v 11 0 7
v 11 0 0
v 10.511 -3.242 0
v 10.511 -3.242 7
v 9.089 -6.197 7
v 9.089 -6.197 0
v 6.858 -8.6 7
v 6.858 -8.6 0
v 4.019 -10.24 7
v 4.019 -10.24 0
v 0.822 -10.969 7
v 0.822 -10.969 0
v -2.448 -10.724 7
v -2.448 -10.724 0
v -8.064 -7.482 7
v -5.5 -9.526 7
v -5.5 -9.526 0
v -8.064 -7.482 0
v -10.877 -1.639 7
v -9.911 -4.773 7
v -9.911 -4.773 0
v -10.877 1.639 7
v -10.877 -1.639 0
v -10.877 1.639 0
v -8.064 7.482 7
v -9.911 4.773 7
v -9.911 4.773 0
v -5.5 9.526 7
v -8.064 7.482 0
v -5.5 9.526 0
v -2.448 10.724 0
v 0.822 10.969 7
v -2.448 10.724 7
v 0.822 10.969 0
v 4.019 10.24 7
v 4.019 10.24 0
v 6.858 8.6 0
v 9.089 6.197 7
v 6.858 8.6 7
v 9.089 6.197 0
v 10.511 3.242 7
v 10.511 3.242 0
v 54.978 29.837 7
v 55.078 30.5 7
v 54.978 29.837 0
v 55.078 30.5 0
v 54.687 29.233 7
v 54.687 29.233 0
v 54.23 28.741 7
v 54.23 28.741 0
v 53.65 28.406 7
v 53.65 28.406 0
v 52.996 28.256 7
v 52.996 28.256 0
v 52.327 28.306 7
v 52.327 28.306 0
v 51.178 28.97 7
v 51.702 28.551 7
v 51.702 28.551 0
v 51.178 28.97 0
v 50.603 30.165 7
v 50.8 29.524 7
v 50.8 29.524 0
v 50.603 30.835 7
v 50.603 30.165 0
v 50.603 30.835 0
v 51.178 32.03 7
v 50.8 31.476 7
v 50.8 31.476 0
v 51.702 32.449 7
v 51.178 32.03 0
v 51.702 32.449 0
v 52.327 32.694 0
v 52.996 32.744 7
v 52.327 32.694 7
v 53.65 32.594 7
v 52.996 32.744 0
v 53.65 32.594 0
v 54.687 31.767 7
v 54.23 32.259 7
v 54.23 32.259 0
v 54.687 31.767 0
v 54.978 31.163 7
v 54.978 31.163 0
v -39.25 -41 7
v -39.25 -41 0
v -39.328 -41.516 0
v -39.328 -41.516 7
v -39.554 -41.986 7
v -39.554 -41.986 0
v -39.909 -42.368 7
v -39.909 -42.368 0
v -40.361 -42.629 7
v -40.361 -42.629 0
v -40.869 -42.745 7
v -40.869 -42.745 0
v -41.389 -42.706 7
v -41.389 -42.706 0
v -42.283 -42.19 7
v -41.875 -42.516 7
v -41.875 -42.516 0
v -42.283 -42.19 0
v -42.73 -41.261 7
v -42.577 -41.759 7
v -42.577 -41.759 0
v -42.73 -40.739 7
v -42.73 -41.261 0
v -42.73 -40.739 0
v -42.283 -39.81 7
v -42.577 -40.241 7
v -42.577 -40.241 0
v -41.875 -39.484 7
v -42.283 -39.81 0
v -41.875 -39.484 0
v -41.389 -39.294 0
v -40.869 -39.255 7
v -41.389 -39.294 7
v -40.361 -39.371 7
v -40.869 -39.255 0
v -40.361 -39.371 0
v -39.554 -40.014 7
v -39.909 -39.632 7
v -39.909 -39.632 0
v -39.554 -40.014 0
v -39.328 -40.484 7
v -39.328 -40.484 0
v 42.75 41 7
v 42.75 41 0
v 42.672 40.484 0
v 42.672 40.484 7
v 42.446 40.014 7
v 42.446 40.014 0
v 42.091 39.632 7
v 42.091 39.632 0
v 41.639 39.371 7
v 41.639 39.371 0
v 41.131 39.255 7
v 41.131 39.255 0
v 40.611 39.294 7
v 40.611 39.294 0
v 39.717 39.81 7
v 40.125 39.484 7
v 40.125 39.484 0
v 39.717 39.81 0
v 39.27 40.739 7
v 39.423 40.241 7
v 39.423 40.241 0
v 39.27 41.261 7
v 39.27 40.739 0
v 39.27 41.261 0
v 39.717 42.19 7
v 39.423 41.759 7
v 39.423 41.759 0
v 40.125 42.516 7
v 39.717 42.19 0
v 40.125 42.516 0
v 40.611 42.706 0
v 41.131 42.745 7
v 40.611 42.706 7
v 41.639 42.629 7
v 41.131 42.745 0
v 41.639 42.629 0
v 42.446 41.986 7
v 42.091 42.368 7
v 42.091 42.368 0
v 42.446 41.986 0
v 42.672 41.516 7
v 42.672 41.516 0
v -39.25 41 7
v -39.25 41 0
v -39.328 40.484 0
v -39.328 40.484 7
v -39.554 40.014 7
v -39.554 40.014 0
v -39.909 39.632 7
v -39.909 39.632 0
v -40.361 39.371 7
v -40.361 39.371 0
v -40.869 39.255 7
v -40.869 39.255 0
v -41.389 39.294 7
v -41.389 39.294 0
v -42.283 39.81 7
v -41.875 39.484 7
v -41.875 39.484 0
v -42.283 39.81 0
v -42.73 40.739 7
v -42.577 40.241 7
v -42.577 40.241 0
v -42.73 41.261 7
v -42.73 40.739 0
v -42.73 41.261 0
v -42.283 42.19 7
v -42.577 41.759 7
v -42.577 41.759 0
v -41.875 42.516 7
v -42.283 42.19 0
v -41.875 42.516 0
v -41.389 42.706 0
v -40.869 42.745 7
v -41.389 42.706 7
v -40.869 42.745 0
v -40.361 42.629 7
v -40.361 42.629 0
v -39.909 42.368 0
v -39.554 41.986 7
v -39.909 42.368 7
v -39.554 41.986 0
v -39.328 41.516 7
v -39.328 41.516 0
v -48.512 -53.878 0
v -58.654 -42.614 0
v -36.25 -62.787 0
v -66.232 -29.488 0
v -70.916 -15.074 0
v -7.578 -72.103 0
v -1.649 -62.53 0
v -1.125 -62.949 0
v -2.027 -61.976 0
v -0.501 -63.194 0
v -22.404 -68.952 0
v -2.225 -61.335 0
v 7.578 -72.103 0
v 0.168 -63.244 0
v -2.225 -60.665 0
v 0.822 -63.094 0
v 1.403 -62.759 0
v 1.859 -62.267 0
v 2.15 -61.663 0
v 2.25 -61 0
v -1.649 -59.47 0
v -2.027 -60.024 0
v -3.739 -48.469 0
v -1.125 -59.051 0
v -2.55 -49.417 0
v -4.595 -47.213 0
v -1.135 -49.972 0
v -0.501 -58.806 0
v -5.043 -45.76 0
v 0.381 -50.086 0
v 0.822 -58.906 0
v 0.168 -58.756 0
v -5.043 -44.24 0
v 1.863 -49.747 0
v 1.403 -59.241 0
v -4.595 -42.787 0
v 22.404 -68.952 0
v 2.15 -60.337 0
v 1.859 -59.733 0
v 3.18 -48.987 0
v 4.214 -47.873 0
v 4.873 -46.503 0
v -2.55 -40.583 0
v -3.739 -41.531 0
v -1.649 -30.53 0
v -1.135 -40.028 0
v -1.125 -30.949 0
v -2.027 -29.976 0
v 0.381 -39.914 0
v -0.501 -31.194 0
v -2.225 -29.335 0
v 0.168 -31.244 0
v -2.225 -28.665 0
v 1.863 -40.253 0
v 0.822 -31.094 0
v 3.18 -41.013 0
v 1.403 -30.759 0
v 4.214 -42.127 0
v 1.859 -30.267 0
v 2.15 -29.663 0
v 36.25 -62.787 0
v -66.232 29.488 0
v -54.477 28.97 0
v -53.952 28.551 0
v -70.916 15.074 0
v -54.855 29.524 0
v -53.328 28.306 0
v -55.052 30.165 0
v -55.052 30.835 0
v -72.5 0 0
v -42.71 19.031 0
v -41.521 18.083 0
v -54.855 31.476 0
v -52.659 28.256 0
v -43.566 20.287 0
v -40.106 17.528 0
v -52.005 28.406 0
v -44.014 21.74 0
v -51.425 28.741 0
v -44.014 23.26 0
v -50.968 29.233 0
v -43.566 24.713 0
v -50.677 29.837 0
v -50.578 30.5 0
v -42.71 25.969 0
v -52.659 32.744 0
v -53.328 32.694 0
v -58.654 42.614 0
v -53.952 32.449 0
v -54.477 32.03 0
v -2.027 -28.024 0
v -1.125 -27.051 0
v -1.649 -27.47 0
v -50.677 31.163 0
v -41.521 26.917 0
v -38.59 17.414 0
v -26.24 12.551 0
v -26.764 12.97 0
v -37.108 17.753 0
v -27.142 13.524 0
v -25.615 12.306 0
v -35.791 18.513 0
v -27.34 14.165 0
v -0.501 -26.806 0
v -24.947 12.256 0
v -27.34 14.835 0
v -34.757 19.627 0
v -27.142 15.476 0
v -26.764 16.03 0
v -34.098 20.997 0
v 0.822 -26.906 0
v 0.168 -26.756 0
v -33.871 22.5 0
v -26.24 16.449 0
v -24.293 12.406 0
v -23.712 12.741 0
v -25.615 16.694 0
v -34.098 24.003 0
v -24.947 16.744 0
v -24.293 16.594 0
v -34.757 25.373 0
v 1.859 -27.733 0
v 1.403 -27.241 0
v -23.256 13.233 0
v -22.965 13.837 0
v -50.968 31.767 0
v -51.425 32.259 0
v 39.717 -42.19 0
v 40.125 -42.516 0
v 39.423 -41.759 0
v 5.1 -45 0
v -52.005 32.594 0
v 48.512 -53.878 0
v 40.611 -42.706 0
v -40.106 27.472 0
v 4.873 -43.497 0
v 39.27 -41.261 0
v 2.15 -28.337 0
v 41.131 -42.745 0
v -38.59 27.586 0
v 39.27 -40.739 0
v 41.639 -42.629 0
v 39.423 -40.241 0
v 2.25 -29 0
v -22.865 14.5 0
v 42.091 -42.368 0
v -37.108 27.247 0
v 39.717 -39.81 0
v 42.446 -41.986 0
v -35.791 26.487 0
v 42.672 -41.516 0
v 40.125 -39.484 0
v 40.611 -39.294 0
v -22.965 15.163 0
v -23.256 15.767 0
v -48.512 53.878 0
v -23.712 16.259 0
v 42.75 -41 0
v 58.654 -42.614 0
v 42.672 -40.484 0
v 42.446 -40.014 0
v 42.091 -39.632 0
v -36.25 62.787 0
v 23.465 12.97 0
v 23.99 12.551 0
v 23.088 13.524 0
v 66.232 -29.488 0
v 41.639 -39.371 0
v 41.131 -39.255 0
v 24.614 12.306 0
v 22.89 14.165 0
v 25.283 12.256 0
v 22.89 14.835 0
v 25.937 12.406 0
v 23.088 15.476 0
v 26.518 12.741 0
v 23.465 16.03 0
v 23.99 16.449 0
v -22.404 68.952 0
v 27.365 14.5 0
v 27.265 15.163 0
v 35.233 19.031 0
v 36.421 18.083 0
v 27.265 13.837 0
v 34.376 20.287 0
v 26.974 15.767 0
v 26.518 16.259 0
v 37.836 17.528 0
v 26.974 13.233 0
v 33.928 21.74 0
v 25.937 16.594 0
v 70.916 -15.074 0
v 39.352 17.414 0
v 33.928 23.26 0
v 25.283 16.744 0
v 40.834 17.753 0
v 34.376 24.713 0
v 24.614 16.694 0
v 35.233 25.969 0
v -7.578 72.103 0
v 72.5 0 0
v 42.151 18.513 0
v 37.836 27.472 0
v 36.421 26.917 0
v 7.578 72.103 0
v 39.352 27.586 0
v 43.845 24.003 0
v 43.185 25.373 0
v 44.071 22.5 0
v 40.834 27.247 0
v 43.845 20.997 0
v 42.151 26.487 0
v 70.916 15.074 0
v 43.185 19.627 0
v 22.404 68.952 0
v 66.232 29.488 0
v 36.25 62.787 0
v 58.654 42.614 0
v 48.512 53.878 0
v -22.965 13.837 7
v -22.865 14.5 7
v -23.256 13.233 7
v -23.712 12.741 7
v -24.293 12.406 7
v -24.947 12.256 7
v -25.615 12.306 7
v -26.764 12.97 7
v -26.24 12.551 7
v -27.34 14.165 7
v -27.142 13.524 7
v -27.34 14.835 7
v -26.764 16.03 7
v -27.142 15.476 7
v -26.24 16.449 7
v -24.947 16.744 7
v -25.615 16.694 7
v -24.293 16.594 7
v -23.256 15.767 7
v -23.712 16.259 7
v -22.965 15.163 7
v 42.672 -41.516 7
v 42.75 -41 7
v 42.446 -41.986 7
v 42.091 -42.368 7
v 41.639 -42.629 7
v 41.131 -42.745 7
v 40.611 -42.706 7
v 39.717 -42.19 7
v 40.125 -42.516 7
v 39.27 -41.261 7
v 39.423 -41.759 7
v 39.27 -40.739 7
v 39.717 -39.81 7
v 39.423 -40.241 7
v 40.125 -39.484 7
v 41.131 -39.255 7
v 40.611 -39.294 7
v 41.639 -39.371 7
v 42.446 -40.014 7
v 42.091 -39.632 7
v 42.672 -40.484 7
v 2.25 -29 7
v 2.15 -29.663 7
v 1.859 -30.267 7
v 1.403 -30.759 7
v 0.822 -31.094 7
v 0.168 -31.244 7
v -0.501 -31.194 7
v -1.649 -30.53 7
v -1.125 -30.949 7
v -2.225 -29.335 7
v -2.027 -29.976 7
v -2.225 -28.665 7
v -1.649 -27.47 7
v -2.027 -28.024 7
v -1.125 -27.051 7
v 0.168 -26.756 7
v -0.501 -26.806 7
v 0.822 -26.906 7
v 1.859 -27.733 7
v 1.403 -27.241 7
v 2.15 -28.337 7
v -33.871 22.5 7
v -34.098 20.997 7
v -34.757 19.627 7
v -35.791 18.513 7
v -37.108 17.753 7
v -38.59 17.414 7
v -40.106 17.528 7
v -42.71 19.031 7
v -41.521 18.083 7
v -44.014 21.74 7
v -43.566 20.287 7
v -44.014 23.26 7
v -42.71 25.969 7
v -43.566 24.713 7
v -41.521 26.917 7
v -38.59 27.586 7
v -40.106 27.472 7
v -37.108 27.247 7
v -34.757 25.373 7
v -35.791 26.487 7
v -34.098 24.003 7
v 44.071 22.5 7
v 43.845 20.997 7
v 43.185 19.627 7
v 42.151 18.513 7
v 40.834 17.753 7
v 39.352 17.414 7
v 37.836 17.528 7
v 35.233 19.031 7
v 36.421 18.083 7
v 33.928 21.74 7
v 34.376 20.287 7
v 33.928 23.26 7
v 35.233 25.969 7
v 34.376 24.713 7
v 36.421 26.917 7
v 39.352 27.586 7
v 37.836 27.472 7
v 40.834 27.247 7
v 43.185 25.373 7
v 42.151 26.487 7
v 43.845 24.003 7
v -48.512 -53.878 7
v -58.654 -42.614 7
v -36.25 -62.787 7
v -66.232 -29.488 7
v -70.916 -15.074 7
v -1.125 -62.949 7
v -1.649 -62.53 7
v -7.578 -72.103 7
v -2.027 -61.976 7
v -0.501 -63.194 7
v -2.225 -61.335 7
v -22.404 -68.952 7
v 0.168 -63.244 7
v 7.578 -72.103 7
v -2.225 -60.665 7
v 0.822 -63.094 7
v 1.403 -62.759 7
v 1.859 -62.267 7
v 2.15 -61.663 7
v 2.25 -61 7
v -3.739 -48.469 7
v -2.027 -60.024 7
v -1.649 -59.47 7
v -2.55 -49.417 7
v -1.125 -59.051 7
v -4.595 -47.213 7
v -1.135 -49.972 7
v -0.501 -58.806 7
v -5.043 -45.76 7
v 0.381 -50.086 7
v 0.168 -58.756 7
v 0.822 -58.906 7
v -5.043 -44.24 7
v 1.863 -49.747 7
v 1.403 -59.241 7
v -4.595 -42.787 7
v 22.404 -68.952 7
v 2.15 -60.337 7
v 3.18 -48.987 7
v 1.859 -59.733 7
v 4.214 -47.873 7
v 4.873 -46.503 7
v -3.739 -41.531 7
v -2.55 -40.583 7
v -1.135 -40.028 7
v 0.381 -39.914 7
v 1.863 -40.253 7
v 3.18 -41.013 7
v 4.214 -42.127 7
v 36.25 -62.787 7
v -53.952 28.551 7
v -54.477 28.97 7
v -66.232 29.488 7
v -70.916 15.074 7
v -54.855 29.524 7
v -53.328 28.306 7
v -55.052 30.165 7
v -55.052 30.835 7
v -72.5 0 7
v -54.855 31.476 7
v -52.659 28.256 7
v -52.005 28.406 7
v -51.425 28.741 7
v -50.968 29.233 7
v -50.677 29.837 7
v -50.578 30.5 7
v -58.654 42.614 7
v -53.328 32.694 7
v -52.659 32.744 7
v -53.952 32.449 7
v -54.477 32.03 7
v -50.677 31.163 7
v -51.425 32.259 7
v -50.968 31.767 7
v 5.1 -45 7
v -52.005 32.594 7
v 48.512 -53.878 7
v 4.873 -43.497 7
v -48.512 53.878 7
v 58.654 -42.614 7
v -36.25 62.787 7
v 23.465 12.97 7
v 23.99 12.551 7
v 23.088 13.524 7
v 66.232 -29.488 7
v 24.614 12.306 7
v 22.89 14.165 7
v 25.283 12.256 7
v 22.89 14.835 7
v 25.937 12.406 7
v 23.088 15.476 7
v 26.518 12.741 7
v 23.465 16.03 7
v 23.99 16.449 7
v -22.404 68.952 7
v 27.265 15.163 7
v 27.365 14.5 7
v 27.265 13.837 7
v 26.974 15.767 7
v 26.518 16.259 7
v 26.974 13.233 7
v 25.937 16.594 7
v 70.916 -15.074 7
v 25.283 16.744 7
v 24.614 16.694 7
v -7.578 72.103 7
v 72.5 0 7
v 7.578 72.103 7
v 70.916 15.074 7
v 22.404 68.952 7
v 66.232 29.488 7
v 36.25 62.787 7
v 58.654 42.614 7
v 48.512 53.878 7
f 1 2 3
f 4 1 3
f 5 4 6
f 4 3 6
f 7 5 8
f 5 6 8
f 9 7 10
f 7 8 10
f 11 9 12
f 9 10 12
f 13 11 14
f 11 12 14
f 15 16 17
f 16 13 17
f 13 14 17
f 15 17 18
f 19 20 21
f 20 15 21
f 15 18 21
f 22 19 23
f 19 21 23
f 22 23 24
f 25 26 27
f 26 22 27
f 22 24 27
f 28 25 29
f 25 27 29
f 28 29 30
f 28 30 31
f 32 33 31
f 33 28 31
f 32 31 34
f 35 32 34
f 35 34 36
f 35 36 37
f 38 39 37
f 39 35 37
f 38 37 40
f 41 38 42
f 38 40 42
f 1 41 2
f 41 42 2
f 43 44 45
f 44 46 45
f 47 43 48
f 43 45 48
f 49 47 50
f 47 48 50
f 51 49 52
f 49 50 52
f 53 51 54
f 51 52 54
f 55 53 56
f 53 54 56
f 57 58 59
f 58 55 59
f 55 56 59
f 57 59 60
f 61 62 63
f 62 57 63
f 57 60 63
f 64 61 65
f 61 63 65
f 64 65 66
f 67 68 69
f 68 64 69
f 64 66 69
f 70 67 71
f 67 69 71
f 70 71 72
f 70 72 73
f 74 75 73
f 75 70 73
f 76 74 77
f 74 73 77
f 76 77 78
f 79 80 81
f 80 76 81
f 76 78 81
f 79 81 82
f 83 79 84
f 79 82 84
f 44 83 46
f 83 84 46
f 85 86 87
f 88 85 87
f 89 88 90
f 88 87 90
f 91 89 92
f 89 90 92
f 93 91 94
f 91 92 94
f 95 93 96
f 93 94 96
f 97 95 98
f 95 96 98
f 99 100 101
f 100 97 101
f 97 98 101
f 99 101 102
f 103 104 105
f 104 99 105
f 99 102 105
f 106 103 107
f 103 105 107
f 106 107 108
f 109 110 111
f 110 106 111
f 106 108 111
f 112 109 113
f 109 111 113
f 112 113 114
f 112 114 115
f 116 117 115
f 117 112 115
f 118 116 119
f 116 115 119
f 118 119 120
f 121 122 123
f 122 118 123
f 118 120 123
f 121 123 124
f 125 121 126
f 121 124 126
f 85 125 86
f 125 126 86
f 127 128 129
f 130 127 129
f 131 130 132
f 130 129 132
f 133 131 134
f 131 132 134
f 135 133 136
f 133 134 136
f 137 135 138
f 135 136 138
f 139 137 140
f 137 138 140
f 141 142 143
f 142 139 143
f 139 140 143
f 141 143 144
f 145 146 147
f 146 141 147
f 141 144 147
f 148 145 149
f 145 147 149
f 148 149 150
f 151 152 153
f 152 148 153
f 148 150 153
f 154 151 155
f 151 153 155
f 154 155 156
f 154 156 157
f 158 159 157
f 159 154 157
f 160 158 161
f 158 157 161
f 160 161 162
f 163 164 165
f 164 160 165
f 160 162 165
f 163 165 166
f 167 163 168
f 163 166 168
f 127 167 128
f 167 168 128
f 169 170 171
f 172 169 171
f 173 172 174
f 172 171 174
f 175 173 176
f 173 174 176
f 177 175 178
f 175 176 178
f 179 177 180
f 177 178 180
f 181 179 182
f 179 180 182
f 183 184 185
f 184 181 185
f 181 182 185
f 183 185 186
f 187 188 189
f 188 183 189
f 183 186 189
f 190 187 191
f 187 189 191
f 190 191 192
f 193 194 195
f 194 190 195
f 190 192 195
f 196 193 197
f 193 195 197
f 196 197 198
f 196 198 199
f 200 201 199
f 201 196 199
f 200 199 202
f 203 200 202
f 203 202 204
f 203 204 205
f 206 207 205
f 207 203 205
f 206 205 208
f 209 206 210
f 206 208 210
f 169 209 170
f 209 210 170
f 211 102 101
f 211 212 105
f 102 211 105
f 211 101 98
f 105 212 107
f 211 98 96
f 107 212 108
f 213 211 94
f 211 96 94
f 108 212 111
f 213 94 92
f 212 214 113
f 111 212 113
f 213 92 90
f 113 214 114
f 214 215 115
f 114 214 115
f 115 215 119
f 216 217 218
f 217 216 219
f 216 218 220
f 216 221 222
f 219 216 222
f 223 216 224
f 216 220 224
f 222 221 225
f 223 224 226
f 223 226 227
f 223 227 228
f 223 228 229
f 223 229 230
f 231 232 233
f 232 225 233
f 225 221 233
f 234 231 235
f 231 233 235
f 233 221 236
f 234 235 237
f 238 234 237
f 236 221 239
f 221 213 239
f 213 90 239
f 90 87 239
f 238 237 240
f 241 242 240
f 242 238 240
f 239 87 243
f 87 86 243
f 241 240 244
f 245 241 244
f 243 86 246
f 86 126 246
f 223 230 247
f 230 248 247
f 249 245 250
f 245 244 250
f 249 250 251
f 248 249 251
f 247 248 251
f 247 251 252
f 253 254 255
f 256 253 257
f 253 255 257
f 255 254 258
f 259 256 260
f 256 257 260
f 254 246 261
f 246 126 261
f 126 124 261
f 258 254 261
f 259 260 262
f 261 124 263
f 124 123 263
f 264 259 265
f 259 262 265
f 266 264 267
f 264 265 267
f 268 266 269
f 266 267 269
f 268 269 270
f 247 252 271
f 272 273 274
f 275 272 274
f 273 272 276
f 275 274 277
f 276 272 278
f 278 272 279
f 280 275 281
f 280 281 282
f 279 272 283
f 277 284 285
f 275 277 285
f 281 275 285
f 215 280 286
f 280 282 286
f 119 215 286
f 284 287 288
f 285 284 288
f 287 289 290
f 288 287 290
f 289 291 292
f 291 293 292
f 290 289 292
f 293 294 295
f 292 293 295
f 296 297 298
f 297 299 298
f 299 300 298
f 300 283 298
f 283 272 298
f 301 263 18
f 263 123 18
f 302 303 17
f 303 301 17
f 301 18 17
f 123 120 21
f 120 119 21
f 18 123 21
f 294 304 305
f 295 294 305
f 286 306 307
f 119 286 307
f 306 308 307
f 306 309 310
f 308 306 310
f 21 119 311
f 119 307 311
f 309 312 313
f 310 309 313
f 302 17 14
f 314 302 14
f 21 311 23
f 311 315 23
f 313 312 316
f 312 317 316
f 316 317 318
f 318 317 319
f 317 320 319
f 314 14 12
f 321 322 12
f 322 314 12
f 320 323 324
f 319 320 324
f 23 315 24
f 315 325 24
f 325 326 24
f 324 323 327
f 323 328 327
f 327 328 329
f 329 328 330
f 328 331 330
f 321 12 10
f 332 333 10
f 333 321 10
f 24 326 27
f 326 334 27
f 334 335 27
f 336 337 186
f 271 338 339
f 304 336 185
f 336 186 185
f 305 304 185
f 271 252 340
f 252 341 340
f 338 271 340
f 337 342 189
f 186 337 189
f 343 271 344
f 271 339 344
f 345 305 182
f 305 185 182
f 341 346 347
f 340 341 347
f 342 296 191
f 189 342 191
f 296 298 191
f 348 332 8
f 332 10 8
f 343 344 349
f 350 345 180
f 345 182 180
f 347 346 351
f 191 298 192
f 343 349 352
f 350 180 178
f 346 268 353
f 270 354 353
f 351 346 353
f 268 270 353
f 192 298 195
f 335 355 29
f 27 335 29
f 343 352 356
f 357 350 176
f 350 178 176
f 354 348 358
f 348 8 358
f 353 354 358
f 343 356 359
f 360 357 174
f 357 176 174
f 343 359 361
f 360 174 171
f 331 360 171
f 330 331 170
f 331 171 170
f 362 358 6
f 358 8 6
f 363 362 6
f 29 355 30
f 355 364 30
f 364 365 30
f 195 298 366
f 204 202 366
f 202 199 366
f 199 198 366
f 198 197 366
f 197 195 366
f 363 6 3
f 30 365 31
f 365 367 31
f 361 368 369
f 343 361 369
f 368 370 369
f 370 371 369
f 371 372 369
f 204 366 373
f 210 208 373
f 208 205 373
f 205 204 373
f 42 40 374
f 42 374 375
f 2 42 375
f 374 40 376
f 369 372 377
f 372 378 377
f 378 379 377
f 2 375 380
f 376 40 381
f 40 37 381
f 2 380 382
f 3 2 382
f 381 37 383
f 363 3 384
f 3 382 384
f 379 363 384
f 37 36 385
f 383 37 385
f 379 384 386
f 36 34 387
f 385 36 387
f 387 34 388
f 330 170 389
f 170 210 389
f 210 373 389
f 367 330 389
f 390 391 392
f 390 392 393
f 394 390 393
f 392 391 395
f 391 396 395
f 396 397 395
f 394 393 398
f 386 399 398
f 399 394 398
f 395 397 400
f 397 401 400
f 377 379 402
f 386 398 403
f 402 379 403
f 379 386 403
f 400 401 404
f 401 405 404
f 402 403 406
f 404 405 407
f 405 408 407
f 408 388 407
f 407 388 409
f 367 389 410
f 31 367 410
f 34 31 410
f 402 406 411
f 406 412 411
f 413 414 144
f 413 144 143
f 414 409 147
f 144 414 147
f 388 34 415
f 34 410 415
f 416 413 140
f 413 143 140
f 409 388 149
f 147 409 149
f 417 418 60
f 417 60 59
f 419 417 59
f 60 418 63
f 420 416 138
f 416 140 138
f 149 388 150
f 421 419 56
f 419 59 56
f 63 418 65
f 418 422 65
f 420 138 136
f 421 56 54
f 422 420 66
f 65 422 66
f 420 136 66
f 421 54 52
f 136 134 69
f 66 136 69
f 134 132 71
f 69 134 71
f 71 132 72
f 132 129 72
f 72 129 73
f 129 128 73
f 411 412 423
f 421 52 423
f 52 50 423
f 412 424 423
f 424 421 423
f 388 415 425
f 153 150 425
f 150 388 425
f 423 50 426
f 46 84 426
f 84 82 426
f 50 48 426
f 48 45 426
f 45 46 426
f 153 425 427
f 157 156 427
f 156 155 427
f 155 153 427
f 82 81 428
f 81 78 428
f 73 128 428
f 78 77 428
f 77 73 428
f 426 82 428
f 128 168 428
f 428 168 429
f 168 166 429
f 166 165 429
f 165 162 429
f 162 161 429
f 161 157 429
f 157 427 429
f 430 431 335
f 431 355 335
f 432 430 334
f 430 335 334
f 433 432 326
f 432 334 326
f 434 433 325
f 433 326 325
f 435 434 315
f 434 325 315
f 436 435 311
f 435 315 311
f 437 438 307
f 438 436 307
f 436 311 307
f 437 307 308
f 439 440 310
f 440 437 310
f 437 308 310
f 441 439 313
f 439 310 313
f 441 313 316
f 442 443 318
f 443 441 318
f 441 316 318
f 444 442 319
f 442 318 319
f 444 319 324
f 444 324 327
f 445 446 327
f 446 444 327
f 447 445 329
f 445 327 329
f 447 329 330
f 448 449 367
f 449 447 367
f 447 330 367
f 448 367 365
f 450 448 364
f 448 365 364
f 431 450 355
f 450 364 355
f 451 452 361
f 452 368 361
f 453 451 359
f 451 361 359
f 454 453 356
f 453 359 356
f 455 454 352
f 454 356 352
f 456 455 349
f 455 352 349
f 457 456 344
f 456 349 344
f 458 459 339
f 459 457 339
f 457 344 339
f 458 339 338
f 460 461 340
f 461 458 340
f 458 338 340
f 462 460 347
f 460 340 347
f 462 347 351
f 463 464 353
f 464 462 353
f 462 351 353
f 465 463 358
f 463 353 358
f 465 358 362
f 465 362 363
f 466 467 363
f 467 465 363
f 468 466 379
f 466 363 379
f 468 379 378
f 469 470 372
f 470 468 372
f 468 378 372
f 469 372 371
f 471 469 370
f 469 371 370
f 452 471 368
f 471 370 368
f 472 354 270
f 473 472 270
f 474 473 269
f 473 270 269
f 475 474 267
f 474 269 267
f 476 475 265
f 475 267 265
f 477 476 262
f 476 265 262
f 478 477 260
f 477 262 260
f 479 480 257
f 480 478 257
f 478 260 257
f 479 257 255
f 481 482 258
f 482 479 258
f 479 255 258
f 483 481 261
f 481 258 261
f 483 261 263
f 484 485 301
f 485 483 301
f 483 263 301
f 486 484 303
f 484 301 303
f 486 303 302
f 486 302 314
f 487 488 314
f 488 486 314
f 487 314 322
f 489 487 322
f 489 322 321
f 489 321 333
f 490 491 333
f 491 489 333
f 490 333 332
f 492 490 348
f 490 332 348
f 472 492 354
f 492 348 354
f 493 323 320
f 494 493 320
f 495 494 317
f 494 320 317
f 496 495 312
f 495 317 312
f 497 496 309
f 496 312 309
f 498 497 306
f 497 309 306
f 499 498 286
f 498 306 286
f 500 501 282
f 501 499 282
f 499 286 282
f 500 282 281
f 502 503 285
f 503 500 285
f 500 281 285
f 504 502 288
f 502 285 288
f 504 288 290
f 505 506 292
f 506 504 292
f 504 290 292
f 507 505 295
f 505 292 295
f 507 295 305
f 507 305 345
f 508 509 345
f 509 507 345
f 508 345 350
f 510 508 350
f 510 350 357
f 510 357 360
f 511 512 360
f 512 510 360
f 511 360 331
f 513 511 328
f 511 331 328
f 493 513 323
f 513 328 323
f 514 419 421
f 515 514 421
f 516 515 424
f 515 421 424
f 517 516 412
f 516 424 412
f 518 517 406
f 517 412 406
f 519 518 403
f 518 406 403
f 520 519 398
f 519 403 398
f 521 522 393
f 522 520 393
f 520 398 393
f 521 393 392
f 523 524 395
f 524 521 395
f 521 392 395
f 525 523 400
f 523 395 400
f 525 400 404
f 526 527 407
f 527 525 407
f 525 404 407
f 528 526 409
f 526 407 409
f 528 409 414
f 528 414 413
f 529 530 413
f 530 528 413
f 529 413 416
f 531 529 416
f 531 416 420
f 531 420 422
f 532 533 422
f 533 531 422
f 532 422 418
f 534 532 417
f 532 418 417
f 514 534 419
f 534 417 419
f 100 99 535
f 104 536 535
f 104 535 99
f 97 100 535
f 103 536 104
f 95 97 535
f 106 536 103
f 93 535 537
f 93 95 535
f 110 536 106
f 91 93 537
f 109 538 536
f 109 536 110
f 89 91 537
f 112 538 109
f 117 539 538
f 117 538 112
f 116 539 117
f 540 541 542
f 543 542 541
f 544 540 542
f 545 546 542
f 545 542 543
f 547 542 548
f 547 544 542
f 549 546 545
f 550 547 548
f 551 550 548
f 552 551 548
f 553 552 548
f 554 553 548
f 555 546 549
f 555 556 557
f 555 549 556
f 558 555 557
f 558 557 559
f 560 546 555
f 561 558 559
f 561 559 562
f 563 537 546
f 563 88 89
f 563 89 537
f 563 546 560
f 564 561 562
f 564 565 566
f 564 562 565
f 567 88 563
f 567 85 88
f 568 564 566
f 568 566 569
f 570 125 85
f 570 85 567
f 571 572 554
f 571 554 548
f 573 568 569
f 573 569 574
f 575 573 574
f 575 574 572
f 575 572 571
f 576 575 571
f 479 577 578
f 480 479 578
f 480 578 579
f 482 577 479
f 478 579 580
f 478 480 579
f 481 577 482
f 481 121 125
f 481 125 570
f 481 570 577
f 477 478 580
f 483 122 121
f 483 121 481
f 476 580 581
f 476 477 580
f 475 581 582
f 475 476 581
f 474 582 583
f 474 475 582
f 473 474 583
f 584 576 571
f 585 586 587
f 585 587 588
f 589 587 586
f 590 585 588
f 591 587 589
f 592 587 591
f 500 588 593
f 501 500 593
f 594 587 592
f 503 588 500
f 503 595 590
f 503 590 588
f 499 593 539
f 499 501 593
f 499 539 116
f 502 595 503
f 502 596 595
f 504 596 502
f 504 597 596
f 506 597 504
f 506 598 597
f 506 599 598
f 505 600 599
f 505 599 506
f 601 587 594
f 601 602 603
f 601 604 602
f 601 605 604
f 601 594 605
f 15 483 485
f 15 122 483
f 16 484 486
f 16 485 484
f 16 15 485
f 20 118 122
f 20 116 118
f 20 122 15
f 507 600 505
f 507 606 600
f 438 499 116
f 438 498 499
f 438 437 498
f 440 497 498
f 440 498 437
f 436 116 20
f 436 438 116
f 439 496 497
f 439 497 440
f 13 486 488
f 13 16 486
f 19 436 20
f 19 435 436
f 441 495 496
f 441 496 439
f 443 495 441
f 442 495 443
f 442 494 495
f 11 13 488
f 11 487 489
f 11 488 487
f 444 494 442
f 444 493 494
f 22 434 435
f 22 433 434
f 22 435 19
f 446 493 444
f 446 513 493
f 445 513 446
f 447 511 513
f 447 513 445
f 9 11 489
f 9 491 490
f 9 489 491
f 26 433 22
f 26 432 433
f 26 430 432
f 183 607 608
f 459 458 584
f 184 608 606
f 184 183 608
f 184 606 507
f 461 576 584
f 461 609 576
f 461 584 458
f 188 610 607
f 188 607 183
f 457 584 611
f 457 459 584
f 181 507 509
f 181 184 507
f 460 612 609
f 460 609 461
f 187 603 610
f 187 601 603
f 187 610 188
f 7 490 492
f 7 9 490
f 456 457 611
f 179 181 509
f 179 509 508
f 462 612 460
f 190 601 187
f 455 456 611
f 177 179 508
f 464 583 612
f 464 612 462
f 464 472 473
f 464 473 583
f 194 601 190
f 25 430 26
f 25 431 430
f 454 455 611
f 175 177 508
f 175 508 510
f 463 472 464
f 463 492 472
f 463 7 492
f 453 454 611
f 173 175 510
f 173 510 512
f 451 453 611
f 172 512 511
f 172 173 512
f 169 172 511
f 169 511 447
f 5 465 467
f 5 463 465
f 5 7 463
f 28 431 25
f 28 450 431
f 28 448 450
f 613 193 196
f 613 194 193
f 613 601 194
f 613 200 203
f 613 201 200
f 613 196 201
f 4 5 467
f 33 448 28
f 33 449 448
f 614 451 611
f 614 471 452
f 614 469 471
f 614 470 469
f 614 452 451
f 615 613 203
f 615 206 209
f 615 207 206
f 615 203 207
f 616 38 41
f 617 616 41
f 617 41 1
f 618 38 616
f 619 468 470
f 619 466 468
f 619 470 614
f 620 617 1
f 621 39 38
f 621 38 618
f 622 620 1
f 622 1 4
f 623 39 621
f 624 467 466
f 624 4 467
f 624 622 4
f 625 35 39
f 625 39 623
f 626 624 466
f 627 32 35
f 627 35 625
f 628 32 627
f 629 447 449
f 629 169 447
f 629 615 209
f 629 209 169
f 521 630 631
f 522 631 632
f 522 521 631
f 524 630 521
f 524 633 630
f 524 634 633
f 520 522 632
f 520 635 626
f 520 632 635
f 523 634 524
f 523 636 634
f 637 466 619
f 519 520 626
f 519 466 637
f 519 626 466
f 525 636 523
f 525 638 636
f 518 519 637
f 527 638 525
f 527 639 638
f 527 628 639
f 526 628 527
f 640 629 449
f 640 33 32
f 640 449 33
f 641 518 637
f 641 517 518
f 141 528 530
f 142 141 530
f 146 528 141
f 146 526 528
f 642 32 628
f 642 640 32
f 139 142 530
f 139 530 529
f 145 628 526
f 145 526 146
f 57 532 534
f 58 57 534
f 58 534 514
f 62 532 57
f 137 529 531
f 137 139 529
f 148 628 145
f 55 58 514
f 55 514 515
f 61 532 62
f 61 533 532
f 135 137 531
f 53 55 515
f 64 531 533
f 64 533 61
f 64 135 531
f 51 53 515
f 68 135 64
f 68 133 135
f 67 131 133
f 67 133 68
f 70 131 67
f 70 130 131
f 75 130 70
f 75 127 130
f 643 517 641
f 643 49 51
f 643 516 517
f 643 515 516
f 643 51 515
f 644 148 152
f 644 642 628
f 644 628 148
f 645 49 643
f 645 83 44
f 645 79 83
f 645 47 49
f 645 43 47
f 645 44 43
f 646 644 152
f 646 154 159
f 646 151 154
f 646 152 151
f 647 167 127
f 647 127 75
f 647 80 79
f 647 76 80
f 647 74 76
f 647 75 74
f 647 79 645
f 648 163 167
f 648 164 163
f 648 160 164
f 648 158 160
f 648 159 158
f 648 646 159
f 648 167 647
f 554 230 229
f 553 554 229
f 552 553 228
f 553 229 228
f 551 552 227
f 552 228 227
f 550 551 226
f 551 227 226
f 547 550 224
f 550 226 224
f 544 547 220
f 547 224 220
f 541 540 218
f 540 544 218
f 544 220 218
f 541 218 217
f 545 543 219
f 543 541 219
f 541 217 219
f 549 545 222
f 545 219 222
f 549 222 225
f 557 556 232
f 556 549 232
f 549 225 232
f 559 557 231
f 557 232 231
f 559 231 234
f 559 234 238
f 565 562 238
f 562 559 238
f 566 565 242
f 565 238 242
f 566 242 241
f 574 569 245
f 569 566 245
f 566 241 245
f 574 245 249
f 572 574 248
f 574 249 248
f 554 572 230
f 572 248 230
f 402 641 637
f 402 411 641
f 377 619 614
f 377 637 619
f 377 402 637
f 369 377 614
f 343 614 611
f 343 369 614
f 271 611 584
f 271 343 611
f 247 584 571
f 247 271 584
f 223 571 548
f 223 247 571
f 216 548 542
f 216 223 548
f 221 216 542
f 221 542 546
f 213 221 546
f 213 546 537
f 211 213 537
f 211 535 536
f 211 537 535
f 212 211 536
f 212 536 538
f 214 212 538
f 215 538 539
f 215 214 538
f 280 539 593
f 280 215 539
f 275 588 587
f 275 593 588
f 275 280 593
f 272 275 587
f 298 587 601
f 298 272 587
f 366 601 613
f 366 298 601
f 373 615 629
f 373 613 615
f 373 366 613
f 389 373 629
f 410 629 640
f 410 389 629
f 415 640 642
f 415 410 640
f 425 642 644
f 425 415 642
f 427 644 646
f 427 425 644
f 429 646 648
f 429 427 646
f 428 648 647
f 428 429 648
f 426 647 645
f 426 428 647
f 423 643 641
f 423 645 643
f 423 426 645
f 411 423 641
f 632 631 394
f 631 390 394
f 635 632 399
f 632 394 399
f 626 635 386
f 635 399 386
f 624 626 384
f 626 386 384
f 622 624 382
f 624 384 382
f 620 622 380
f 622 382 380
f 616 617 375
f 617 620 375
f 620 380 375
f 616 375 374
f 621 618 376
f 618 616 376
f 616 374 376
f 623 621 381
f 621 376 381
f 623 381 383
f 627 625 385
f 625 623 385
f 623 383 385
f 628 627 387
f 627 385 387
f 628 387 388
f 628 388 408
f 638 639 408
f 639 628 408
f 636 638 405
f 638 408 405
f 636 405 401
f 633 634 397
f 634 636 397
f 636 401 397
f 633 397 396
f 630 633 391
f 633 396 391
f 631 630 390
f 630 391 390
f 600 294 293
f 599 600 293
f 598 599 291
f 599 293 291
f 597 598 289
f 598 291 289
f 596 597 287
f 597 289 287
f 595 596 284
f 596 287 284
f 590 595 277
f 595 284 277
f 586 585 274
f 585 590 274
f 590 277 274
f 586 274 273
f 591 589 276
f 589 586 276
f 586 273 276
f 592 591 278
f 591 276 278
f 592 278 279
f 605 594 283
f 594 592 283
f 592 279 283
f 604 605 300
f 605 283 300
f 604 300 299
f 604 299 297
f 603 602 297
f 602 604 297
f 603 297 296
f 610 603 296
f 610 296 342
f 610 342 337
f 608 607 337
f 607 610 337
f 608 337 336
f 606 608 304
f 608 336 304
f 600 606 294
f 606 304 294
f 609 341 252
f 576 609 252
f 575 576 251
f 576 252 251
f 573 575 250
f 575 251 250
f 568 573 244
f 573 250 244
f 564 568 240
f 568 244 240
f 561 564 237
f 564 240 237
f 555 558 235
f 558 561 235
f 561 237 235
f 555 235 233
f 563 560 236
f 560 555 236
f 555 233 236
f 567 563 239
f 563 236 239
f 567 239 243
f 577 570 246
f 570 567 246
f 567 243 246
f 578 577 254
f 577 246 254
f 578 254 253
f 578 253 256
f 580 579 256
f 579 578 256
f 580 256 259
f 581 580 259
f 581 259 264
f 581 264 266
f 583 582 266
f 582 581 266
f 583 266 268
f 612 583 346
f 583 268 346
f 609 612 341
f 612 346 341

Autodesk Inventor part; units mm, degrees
ref_plane "YZ Plane" through (0, 0, 0) normal (1, 0, 0) x (0, 1, 0)
ref_plane "XZ Plane" through (0, 0, 0) normal (0, 1, 0) x (-1, 0, 0)
ref_plane "XY Plane" through (0, 0, 0) normal (0, 0, 1) x (1, 0, 0)
sketch "Sketch1" plane through (0, 0, 0) normal (0, 0, 1) x (1, 0, 0)
  circle A0 centre (0, 0) radius 72.5
  line L0 (-41, 0) -> (41, 0) construction
  line L1 (0, -41) -> (0, 41) construction
  line L2 (0, 41) -> (41, 41) construction
  line L3 (41, 41) -> (41, 0) construction
  circle A1 centre (41, 41) radius 1.75
  circle A2 centre (41, -41) radius 1.75
  circle A3 centre (-41, 41) radius 1.75
  circle A4 centre (-41, -41) radius 1.75
  circle A5 centre (41, 41) radius 5 construction
  circle A6 centre (41, -41) radius 5 construction
  circle A7 centre (-41, -41) radius 5 construction
  circle A8 centre (-41, 41) radius 5 construction
  line L4 (0, 0) -> (0, -45) construction
  circle A9 centre (0, 0) radius 45 construction
  circle A10 centre (0, 0) radius 11
  circle A11 centre (0, -45) radius 5.1
  line L5 (0, -61) -> (0, -29) construction
  circle A12 centre (0, -61) radius 2.25
  circle A13 centre (0, -29) radius 2.25
  circle A14 centre (52.8275, 30.5) radius 2.25
  line L6 (52.8275, 30.5) -> (25.1147, 14.5) construction
  circle A15 centre (38.9711, 22.5) radius 5.1
  circle A16 centre (25.1147, 14.5) radius 2.25
  circle A17 centre (-52.8275, 30.5) radius 2.25
  line L7 (-52.8275, 30.5) -> (-25.1147, 14.5) construction
  circle A18 centre (-38.9711, 22.5) radius 5.1
  circle A19 centre (-25.1147, 14.5) radius 2.25
  point P0 (38.9711, 22.5)
  dimension "d0" = 145
  dimension "L_furos" = 82
  dimension "d2" = 82
  dimension "d3" = 3.5
  dimension "d4" = 10
  dimension "d5" = 45
  dimension "d24" = 360
  dimension "d49" = 22
  dimension "d52" = 10.2
  dimension "d54" = 32
  dimension "d55" = 4.5
  dimension "d56" = 4.5
  dimension "d59" = 360
extrude "Extrusion1" add sketch "Sketch1" along normal blind 7
equation "\"d2\" = L_furos"
equation "\"d21\" = 5.5"
equation "\"d39\" = 5.5"
properties part number "SupBase"
